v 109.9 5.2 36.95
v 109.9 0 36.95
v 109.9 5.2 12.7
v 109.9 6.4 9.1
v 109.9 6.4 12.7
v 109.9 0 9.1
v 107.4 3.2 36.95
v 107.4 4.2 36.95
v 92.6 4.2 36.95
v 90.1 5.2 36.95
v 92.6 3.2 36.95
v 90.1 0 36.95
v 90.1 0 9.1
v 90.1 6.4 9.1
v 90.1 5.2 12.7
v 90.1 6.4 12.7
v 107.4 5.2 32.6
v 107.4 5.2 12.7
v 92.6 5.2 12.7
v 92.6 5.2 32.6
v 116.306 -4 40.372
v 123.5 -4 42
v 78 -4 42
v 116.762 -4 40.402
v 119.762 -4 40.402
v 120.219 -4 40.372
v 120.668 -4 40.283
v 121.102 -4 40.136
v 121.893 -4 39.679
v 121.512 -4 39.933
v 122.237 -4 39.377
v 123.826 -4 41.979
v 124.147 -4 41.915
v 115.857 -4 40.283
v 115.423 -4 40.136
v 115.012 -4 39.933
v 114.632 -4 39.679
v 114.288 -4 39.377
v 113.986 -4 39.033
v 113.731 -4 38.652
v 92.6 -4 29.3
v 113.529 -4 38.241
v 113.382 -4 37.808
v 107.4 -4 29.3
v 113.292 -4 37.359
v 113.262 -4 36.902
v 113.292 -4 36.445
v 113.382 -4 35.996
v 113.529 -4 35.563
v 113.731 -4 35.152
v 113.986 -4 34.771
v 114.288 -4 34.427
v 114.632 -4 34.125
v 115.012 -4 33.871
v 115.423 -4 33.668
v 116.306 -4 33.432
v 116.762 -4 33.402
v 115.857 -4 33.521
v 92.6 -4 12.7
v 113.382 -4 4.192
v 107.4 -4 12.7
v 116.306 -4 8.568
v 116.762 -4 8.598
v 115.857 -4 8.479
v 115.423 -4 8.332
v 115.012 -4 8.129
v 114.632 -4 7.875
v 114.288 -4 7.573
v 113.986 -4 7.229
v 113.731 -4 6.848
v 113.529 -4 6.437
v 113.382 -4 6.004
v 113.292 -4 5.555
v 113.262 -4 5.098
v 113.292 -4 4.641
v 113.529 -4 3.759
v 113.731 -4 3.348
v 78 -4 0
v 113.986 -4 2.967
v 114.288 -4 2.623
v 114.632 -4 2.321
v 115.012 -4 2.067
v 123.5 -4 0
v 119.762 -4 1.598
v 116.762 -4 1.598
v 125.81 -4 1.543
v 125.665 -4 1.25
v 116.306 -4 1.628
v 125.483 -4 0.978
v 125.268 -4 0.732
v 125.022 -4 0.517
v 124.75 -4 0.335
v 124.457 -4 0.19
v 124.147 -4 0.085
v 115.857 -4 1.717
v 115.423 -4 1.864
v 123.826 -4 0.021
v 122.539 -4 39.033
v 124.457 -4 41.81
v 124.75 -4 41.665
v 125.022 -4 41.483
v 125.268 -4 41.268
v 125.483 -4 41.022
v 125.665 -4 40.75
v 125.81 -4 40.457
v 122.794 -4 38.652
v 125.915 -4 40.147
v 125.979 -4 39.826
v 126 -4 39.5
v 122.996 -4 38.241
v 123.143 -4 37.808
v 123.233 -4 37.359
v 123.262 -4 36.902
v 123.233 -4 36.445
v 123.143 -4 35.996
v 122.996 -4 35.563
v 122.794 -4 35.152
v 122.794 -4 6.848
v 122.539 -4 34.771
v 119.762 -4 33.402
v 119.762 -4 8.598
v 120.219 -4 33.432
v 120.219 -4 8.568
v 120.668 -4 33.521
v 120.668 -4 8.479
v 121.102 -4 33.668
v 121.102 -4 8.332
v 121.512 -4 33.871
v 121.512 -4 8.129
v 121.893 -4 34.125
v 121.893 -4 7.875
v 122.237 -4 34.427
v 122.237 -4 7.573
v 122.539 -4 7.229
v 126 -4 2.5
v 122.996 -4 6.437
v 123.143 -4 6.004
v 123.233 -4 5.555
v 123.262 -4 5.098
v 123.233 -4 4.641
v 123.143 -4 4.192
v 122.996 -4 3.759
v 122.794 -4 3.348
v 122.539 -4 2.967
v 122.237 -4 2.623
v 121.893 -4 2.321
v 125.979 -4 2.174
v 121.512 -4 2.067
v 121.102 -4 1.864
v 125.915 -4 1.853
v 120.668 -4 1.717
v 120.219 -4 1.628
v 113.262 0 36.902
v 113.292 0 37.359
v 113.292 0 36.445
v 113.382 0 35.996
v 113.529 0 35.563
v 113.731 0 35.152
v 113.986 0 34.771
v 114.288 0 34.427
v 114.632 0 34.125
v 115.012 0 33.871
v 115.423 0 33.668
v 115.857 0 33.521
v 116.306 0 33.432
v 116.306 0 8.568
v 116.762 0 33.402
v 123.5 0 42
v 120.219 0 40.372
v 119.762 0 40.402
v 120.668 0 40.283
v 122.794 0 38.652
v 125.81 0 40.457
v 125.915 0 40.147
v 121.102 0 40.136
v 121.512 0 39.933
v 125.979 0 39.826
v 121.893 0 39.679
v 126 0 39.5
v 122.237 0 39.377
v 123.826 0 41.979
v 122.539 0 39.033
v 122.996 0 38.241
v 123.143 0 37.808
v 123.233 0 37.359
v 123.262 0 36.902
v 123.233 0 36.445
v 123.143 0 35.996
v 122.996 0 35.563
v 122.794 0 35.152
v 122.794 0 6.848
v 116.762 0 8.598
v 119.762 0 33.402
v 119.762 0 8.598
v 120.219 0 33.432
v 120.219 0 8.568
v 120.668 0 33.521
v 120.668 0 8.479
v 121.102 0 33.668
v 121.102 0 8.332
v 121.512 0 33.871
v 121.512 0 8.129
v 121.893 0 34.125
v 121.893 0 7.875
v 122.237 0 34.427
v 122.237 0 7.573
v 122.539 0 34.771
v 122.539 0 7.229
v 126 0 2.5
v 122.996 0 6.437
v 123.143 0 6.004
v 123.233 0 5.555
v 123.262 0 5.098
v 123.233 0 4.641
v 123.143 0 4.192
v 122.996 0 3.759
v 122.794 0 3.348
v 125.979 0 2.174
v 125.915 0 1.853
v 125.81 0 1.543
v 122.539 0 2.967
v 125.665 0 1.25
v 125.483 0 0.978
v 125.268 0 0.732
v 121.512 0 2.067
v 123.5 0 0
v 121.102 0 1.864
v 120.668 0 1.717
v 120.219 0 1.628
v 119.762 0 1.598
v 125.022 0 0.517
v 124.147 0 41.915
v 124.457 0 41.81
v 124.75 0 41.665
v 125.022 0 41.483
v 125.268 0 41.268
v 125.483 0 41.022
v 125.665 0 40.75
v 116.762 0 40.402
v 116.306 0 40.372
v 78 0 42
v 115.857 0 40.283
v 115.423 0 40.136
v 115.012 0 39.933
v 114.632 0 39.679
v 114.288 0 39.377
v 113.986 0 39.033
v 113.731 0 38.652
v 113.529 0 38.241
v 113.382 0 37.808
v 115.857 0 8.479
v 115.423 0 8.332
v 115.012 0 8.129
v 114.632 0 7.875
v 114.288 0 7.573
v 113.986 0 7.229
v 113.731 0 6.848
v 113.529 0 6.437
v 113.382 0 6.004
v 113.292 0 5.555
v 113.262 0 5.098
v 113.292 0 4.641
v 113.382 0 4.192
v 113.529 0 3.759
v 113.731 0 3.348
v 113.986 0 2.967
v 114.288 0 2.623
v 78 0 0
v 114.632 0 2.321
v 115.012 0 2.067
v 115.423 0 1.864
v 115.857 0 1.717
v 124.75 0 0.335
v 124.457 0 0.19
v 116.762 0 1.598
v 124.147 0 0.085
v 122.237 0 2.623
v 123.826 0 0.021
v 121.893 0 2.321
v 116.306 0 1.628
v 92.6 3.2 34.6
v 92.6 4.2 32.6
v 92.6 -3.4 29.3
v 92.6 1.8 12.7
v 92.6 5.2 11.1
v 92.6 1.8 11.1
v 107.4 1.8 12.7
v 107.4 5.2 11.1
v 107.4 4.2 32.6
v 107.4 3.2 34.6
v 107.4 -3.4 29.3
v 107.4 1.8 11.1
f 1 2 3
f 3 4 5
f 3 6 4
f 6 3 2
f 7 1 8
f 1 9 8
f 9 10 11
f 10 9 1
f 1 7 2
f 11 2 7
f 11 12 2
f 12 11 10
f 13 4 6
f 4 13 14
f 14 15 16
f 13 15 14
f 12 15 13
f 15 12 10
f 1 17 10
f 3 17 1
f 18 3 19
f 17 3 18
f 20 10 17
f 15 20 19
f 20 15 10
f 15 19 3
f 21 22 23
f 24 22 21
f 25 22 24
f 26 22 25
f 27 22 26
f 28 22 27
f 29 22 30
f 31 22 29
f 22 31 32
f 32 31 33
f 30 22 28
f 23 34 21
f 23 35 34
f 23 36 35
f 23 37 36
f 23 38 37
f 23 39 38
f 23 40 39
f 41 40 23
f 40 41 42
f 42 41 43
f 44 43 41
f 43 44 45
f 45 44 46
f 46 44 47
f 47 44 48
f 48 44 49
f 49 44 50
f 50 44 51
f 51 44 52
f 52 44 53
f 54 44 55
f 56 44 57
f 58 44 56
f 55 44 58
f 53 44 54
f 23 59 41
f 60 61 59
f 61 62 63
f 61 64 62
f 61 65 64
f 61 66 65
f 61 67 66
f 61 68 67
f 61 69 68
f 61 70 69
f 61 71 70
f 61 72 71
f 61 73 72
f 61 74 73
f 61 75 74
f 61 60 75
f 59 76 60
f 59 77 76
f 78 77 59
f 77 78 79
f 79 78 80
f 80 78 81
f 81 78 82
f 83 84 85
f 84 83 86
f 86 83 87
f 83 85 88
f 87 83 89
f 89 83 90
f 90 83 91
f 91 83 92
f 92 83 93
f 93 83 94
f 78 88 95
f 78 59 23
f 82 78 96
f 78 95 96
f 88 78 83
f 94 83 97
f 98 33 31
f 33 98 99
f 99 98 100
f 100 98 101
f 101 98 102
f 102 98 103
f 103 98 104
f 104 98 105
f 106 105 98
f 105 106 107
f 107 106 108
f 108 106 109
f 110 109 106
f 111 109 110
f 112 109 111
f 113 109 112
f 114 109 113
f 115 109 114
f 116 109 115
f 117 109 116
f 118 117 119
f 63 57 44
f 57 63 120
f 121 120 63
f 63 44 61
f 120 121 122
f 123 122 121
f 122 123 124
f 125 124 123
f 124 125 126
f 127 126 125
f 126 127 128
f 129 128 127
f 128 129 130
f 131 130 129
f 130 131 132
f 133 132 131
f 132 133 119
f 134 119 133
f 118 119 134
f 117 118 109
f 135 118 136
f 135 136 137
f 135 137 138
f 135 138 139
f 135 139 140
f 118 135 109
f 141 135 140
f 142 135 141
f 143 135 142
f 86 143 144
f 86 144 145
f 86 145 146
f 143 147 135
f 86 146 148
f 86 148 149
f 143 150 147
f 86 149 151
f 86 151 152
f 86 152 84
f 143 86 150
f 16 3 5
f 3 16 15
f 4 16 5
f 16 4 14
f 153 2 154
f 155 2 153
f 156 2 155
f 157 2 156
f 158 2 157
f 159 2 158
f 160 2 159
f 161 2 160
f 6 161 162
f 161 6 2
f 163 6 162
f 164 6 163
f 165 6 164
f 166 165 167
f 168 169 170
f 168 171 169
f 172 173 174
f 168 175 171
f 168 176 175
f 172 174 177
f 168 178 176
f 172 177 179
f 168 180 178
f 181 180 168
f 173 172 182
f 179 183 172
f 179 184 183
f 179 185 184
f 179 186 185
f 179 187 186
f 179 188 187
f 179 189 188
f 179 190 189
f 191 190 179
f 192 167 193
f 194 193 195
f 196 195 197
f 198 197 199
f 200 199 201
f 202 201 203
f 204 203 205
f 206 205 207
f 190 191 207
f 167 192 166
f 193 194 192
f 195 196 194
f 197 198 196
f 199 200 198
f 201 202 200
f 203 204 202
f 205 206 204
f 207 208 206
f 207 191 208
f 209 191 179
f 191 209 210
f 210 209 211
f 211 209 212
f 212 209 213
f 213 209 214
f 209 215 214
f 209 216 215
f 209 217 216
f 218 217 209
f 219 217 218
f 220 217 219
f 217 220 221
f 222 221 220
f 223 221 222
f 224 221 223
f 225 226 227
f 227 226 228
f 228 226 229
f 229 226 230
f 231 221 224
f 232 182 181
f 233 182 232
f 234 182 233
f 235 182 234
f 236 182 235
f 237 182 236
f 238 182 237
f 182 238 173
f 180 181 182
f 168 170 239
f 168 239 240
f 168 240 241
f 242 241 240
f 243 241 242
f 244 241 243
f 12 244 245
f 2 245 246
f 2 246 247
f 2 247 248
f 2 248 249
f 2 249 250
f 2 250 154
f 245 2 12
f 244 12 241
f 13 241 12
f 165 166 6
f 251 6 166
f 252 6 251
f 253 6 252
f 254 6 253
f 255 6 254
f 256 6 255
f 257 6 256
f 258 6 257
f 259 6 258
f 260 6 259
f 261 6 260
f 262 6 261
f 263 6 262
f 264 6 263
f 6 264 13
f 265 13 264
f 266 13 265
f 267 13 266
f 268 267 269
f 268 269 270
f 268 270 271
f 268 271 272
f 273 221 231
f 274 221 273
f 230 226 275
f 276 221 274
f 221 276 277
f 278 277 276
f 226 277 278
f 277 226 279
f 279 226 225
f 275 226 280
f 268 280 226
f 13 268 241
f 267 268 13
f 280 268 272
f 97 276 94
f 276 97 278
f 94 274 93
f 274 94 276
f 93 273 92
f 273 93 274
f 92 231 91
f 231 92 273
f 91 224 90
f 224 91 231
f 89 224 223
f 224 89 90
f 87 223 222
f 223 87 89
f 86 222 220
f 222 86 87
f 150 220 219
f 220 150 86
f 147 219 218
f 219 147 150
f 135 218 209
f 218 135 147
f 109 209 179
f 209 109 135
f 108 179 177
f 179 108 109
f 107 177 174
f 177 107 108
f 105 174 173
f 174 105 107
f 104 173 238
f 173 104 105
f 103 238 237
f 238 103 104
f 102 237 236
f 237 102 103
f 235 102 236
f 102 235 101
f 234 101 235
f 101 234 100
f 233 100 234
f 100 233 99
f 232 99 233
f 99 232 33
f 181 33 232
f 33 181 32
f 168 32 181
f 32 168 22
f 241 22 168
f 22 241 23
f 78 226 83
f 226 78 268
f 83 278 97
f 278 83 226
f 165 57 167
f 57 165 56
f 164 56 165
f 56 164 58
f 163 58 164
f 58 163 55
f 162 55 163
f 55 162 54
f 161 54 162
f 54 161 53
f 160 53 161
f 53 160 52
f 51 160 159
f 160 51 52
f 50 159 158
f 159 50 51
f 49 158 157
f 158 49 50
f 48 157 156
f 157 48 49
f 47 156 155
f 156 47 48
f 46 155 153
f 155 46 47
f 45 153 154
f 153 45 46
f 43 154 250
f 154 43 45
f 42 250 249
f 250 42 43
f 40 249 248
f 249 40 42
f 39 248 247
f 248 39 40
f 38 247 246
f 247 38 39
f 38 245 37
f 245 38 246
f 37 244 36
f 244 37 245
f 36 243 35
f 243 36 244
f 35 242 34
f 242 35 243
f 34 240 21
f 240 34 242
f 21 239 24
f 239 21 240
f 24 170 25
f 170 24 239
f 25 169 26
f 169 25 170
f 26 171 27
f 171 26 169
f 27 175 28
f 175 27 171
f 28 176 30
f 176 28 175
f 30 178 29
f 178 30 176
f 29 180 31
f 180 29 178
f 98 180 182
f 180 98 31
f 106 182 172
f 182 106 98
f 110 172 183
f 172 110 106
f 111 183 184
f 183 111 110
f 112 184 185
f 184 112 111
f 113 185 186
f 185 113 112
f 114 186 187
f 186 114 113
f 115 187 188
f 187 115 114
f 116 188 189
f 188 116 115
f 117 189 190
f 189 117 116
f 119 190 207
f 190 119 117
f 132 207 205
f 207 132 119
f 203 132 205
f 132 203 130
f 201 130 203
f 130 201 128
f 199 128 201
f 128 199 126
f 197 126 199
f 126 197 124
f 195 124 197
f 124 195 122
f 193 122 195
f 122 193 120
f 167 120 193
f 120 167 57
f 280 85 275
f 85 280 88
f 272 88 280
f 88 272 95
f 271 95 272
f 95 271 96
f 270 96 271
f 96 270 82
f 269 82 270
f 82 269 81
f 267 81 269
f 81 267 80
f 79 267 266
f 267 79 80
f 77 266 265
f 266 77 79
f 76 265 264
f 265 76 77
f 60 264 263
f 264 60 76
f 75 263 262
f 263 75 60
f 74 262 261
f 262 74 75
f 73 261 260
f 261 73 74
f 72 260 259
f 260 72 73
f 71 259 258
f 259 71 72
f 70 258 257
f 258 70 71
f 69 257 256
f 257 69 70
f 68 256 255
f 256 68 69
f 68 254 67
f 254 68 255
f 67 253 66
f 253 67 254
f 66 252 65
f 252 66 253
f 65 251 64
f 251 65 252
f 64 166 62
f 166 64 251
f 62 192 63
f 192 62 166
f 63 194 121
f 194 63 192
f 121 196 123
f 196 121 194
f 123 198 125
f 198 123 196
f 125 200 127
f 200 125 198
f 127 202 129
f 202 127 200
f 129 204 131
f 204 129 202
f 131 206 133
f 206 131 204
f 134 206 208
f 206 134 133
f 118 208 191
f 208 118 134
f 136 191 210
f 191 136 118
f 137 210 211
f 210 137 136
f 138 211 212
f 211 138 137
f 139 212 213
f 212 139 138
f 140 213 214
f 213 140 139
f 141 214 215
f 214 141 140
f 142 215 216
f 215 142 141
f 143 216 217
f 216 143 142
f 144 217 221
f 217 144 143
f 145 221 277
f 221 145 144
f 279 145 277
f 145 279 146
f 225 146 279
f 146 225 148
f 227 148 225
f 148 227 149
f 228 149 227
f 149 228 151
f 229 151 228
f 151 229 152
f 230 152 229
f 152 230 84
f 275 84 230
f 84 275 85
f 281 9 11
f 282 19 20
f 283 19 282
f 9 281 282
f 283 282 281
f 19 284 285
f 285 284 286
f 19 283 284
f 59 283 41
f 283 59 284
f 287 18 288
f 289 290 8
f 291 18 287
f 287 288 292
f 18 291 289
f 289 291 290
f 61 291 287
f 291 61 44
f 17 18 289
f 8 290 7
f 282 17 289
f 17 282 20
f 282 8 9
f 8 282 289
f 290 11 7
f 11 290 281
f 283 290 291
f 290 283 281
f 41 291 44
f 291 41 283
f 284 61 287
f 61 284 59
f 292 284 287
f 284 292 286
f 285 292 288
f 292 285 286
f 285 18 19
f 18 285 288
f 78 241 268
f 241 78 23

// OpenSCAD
// Lab Rax generic equipment tray + faceplate (wizard template).
// Faceplate derived from the Pi4 baseline; rack holes follow the four-corner layout of the user-supplied
// 1U blank plate (faceplate_mounting.json): EVERY rack unit gets 4 holes, never a single centre pair.
// The wizard appends override assignments at the end of this file.
// PROPOSED, UNVALIDATED: printed fit, strength and rack clearance are UNKNOWN.
$fn=48;
part="assembly";            // assembly, faceplate, tray, combined, rear_bracket
// Device envelope (mm). Origin of hole coordinates = device front-left corner, seen from above.
dev_w=85; dev_d=56; dev_h=20;
holes=[];                   // [[x,y],...] mounting hole centres
hole_d=2.7;                 // device mounting hole diameter
device_mount="inserts";     // inserts, pegs, clips, straps
standoff=6;                 // device lift above tray floor
insert_pilot=3.2;           // pilot for heat-set insert (inserts mode)
board_t=1.6;                // board/flange thickness (pegs, clips)
joint="screw";              // screw, snap, single
u=1;                        // faceplate height in rack units
keystones=[];               // [x,...] keystone centres on faceplate (X=0 centre)
// Keystone v2 (2026-10-19): re-modelled from measurements of Brian's reference keystone frame
// (14.5 x 16 opening was too narrow when printed). Opening 14.8 x 16.6 through the plate, plus a rear collar
// 19.8 x 27.85 reaching 9.2 mm behind the front face (bottom lip to 10.4) that carries the latch ramp and catches.
ks_w=14.8; ks_h=16.6;       // front opening
ks_ow=19.8; ks_ob=11.9; ks_ot=15.95; ks_od=9.2; ks_lip=10.4;  // collar width, below/above opening centre, depth
ports=[];                   // [[x,z,w,h,r],...] faceplate cut-outs, z from plate bottom, r=corner radius
front_gap=12;               // device front to faceplate rear face
margin=8;                   // tray border around device
rear_support=false;         // heavy/deep equipment: tray runs to the rear posts and screws to a rear bracket
coupon=[];                  // test coupon: [x0,x1,ymax] keeps only that slice of the part

// 4 mm plate (owner default 2026-10-18). Corner radius is limited by the four-corner holes:
// the reference holes sit 1.6 mm from the top/bottom edge, so larger corners would cut into them.
plate_w=252; plate_t=4; plate_r=2.5; plate_h=u*44.45-2.45;
hole_x=118.2625; hole_dz=15.902;   // each U: holes at its centre ±hole_dz (5.098 / 36.902 on a 1U plate)
rack_depth=240;             // Lab Rax frame depth (front of front posts to back of rear posts)
nudge=0;                    // render-repair only: tiny size offset applied when OpenSCAD 2021 emits a sliver
tray_t=3; tray_z=7;
tray_w=dev_w+2*margin; tray_d=rear_support?rack_depth:dev_d+front_gap+margin;
tray_x=-tray_w/2; tray_y=0;
dev_x=-dev_w/2; dev_y=front_gap; floor_top=tray_z+tray_t;
jx=min(40,tray_w/2-12); joint_x=[-jx,jx];
tongue_w=12; tongue_depth=7; tongue_h=3; tongue_z=tray_z+3.5;
slot_clear=0.3; boss_d=9; m3_clear=3.4; joint_pilot=4.0;  // 4.0 = the printed, well-fitting Pi4 trial

module capsule2d(len=10,diam=7){hull(){translate([-(len-diam)/2,0])circle(d=diam);translate([(len-diam)/2,0])circle(d=diam);}}
module rrect(w,h,r){rr=min(r,w/2-0.01,h/2-0.01);if(rr<=0)square([w,h],center=true);else offset(r=rr)square([w-2*rr,h-2*rr],center=true);}
// Mirror front-of-tray features to the rear (about the rack's mid-depth).
module to_rear(){translate([0,rack_depth/2,0])mirror([0,1,0])translate([0,-rack_depth/2,0])children();}

// Faceplate outline seen from the front: 2D X = rack X, 2D Y = height Z.
// rear=true cuts the larger keystone pocket; plain=true leaves out keystones/ports (rear bracket).
module plate2d(rear=false,plain=false){
 difference(){
  hull()for(sx=[-1,1],sz=[-1,1])translate([sx*(plate_w/2-plate_r),plate_h/2+sz*(plate_h/2-plate_r)])circle(r=plate_r+nudge);
  for(i=[0:u-1],dz=[-hole_dz,hole_dz],x=[-hole_x,hole_x])translate([x,i*44.45+21+dz])capsule2d();
  if(!plain){
   for(p=ports)translate([p[0],p[1]])rrect(p[2],p[3],p[4]);
  }
 }
}
// Plate between y=y0 (front) and y0+t, built from the 2D outline (cleaner meshes than 3D cuts in OpenSCAD 2021).
module plate_layer(y0,t,rear=false,plain=false){translate([0,y0+t,0])rotate([90,0,0])linear_extrude(height=t)plate2d(rear,plain);}

module plate_joint_add(){
 if(joint=="screw"){
  for(x=joint_x)translate([x-tongue_w/2,0,tongue_z])cube([tongue_w,tongue_depth,tongue_h]);
  for(x=joint_x)translate([x,0,tray_z+14])rotate([-90,0,0])cylinder(d=boss_d,h=8);
 }
 if(joint=="snap") for(x=joint_x){
  // Cantilever arm under the tray floor; barb snaps up into a floor window.
  translate([x-4,0,tray_z-2])cube([8,16,2]);
  // Barb v2: square catch face toward the plate, ramp falling toward the rear so the tray, slid in
  // from the rear, cams the arm down until its window drops over the barb.
  translate([x-4,12,tray_z])hull(){cube([8,0.6,1.2]);cube([8,2.4,0.01]);}
 }
}
// Keystone collar behind the plate, and the jack-shaped cut through plate + collar.
// Profile in (d = depth behind front face, z from opening centre); X width is ks_w throughout.
module ks_collar(){for(x=keystones)translate([x-ks_ow/2,-plate_t,plate_h/2]){
 translate([0,0,-ks_ob])cube([ks_ow,ks_od,ks_ob+ks_ot]);
 translate([0,0,-ks_ob])cube([ks_ow,ks_lip,ks_ob-ks_h/2]);
}}
module ks_cut(){for(x=keystones)translate([x-ks_w/2,-plate_t,plate_h/2])rotate([90,0,90])linear_extrude(height=ks_w)
 polygon([[-1,-ks_h/2],[5.8,-ks_h/2],[5.8,-9.9],[9.2,-9.9],[9.2,-ks_h/2],[11,-ks_h/2],[11,11.6],[8.2,11.6],
          [8.2,ks_ot+1],[7.2,ks_ot+1],[7.2,13.6],[0.6,ks_h/2],[-1,ks_h/2]]);}
module plate_joint_cut(){if(joint=="screw")for(x=joint_x)translate([x,-0.1,tray_z+14])rotate([-90,0,0])cylinder(d=joint_pilot,h=8.2);}

module faceplate(){
 difference(){
  union(){
   plate_layer(-plate_t,plate_t);
   ks_collar();
   plate_joint_add();
  }
  plate_joint_cut();
  ks_cut();
 }
}
// Plain plate on the rear posts (mirror of the faceplate, no openings) that the tray's rear end screws/snaps to.
module rear_bracket(){to_rear()difference(){union(){plate_layer(-plate_t,plate_t,false,true);plate_joint_add();}plate_joint_cut();}}

module device_features_add(){
 if(device_mount=="inserts")for(h=holes)translate([dev_x+h[0],dev_y+h[1],floor_top])cylinder(d=max(insert_pilot+3.5,7),h=standoff);
 if(device_mount=="pegs")for(h=holes)translate([dev_x+h[0],dev_y+h[1],floor_top]){
  cylinder(d=hole_d+3,h=standoff);
  translate([0,0,standoff])cylinder(d=hole_d-0.3,h=board_t+0.8);
  translate([0,0,standoff+board_t+0.8])cylinder(d1=hole_d-0.3,d2=hole_d-1,h=0.8);
 }
 if(device_mount=="clips"){
  // Support ledges at the four corners plus a flexing clip on each side.
  for(x=[dev_x-1,dev_x+dev_w-5],y=[dev_y-1,dev_y+dev_d-5])translate([x,y,floor_top])cube([6,6,standoff]);
  for(s=[-1,1])translate([s>0?dev_x+dev_w+0.2:dev_x-2.2,dev_y+dev_d/2-5,floor_top]){
   cube([2,10,standoff+board_t+2.5]);
   translate([s>0?-1.2:2,0,standoff+board_t+0.2])hull(){cube([1.2,10,1.6]);translate([s>0?1.2:0,0,1.6])cube([0.01,10,0.6]);}
  }
 }
}
module device_features_cut(){
 if(device_mount=="inserts")for(h=holes)translate([dev_x+h[0],dev_y+h[1],floor_top+0.01])cylinder(d=insert_pilot,h=standoff+0.1);
 if(device_mount=="straps")for(x=[dev_x-5.5,dev_x+dev_w+2.5],y=[dev_y+dev_d*0.25,dev_y+dev_d*0.75])
  translate([x,y-6,tray_z-0.1])cube([3,12,tray_t+0.2]);
}

module tray_joint_add(){
 if(joint=="screw"){
  for(x=joint_x) translate([x-9,0,tray_z+tray_t])cube([18,8,5]);
  for(x=joint_x)translate([x-7,8.3,tray_z+3])cube([14,3,19]);
  for(x=joint_x) for(side=[-1,1]) translate([x+side*6-1,0,0])
    hull(){translate([0,9,tray_z+2.7])cube([2,2,0.5]);
           translate([0,9,tray_z+8])cube([2,2,0.5]);
           translate([0,20,tray_z+2.7])cube([2,2,0.5]);}
 }
}
module tray_joint_cut(){
 if(joint=="screw"){
  for(x=joint_x)translate([x-(tongue_w+slot_clear)/2,-0.1,tongue_z-slot_clear/2])cube([tongue_w+slot_clear,tongue_depth+slot_clear,tongue_h+slot_clear]);
  for(x=joint_x)translate([x,11.4,tray_z+14])rotate([90,0,0])cylinder(d=m3_clear,h=12);
 }
 if(joint=="snap")for(x=joint_x)translate([x-4.3,11.6,tray_z-0.1])cube([8.6,3.2,tray_t+0.2]);
}

module tray(){
 difference(){
  union(){
   translate([tray_x,tray_y,tray_z])cube([tray_w,tray_d,tray_t]);
   tray_joint_add();
   if(rear_support)to_rear()tray_joint_add();
   device_features_add();
  }
  tray_joint_cut();
  if(rear_support)to_rear()tray_joint_cut();
  device_features_cut();
 }
}

module clip_coupon(){if(len(coupon)==3)intersection(){children();translate([coupon[0],-50,-50])cube([coupon[1]-coupon[0],coupon[2]+50,400]);}else children();}

clip_coupon(){
 if(part=="faceplate")faceplate();
 else if(part=="tray")tray();
 else if(part=="rear_bracket")rear_bracket();
 else if(part=="combined")union(){faceplate();translate([tray_x,-0.01,tray_z])cube([tray_w,0.02+0.01,tray_t]);tray();if(rear_support)rear_bracket();}
 else {color("steelblue")faceplate();color("silver")tray();if(rear_support)color("steelblue")rear_bracket();
  %translate([dev_x,dev_y,floor_top+(device_mount=="inserts"||device_mount=="pegs"||device_mount=="clips"?standoff:0)])cube([dev_w,dev_d,dev_h]);}
}

// ---- wizard overrides: 1_Keystone_and_corner_holes
dev_w=85.0;
dev_d=56.0;
dev_h=20.0;
hole_d=2.7;
standoff=6.0;
insert_pilot=3.2;
board_t=1.6;
u=1;
holes=[[3.5, 3.5], [61.5, 3.5], [3.5, 52.5], [61.5, 52.5]];
keystones=[100.0];
device_mount="inserts";
joint="screw";
rear_support=false;
coupon=[78.0, 127.0, 11.0];
ports=[];
